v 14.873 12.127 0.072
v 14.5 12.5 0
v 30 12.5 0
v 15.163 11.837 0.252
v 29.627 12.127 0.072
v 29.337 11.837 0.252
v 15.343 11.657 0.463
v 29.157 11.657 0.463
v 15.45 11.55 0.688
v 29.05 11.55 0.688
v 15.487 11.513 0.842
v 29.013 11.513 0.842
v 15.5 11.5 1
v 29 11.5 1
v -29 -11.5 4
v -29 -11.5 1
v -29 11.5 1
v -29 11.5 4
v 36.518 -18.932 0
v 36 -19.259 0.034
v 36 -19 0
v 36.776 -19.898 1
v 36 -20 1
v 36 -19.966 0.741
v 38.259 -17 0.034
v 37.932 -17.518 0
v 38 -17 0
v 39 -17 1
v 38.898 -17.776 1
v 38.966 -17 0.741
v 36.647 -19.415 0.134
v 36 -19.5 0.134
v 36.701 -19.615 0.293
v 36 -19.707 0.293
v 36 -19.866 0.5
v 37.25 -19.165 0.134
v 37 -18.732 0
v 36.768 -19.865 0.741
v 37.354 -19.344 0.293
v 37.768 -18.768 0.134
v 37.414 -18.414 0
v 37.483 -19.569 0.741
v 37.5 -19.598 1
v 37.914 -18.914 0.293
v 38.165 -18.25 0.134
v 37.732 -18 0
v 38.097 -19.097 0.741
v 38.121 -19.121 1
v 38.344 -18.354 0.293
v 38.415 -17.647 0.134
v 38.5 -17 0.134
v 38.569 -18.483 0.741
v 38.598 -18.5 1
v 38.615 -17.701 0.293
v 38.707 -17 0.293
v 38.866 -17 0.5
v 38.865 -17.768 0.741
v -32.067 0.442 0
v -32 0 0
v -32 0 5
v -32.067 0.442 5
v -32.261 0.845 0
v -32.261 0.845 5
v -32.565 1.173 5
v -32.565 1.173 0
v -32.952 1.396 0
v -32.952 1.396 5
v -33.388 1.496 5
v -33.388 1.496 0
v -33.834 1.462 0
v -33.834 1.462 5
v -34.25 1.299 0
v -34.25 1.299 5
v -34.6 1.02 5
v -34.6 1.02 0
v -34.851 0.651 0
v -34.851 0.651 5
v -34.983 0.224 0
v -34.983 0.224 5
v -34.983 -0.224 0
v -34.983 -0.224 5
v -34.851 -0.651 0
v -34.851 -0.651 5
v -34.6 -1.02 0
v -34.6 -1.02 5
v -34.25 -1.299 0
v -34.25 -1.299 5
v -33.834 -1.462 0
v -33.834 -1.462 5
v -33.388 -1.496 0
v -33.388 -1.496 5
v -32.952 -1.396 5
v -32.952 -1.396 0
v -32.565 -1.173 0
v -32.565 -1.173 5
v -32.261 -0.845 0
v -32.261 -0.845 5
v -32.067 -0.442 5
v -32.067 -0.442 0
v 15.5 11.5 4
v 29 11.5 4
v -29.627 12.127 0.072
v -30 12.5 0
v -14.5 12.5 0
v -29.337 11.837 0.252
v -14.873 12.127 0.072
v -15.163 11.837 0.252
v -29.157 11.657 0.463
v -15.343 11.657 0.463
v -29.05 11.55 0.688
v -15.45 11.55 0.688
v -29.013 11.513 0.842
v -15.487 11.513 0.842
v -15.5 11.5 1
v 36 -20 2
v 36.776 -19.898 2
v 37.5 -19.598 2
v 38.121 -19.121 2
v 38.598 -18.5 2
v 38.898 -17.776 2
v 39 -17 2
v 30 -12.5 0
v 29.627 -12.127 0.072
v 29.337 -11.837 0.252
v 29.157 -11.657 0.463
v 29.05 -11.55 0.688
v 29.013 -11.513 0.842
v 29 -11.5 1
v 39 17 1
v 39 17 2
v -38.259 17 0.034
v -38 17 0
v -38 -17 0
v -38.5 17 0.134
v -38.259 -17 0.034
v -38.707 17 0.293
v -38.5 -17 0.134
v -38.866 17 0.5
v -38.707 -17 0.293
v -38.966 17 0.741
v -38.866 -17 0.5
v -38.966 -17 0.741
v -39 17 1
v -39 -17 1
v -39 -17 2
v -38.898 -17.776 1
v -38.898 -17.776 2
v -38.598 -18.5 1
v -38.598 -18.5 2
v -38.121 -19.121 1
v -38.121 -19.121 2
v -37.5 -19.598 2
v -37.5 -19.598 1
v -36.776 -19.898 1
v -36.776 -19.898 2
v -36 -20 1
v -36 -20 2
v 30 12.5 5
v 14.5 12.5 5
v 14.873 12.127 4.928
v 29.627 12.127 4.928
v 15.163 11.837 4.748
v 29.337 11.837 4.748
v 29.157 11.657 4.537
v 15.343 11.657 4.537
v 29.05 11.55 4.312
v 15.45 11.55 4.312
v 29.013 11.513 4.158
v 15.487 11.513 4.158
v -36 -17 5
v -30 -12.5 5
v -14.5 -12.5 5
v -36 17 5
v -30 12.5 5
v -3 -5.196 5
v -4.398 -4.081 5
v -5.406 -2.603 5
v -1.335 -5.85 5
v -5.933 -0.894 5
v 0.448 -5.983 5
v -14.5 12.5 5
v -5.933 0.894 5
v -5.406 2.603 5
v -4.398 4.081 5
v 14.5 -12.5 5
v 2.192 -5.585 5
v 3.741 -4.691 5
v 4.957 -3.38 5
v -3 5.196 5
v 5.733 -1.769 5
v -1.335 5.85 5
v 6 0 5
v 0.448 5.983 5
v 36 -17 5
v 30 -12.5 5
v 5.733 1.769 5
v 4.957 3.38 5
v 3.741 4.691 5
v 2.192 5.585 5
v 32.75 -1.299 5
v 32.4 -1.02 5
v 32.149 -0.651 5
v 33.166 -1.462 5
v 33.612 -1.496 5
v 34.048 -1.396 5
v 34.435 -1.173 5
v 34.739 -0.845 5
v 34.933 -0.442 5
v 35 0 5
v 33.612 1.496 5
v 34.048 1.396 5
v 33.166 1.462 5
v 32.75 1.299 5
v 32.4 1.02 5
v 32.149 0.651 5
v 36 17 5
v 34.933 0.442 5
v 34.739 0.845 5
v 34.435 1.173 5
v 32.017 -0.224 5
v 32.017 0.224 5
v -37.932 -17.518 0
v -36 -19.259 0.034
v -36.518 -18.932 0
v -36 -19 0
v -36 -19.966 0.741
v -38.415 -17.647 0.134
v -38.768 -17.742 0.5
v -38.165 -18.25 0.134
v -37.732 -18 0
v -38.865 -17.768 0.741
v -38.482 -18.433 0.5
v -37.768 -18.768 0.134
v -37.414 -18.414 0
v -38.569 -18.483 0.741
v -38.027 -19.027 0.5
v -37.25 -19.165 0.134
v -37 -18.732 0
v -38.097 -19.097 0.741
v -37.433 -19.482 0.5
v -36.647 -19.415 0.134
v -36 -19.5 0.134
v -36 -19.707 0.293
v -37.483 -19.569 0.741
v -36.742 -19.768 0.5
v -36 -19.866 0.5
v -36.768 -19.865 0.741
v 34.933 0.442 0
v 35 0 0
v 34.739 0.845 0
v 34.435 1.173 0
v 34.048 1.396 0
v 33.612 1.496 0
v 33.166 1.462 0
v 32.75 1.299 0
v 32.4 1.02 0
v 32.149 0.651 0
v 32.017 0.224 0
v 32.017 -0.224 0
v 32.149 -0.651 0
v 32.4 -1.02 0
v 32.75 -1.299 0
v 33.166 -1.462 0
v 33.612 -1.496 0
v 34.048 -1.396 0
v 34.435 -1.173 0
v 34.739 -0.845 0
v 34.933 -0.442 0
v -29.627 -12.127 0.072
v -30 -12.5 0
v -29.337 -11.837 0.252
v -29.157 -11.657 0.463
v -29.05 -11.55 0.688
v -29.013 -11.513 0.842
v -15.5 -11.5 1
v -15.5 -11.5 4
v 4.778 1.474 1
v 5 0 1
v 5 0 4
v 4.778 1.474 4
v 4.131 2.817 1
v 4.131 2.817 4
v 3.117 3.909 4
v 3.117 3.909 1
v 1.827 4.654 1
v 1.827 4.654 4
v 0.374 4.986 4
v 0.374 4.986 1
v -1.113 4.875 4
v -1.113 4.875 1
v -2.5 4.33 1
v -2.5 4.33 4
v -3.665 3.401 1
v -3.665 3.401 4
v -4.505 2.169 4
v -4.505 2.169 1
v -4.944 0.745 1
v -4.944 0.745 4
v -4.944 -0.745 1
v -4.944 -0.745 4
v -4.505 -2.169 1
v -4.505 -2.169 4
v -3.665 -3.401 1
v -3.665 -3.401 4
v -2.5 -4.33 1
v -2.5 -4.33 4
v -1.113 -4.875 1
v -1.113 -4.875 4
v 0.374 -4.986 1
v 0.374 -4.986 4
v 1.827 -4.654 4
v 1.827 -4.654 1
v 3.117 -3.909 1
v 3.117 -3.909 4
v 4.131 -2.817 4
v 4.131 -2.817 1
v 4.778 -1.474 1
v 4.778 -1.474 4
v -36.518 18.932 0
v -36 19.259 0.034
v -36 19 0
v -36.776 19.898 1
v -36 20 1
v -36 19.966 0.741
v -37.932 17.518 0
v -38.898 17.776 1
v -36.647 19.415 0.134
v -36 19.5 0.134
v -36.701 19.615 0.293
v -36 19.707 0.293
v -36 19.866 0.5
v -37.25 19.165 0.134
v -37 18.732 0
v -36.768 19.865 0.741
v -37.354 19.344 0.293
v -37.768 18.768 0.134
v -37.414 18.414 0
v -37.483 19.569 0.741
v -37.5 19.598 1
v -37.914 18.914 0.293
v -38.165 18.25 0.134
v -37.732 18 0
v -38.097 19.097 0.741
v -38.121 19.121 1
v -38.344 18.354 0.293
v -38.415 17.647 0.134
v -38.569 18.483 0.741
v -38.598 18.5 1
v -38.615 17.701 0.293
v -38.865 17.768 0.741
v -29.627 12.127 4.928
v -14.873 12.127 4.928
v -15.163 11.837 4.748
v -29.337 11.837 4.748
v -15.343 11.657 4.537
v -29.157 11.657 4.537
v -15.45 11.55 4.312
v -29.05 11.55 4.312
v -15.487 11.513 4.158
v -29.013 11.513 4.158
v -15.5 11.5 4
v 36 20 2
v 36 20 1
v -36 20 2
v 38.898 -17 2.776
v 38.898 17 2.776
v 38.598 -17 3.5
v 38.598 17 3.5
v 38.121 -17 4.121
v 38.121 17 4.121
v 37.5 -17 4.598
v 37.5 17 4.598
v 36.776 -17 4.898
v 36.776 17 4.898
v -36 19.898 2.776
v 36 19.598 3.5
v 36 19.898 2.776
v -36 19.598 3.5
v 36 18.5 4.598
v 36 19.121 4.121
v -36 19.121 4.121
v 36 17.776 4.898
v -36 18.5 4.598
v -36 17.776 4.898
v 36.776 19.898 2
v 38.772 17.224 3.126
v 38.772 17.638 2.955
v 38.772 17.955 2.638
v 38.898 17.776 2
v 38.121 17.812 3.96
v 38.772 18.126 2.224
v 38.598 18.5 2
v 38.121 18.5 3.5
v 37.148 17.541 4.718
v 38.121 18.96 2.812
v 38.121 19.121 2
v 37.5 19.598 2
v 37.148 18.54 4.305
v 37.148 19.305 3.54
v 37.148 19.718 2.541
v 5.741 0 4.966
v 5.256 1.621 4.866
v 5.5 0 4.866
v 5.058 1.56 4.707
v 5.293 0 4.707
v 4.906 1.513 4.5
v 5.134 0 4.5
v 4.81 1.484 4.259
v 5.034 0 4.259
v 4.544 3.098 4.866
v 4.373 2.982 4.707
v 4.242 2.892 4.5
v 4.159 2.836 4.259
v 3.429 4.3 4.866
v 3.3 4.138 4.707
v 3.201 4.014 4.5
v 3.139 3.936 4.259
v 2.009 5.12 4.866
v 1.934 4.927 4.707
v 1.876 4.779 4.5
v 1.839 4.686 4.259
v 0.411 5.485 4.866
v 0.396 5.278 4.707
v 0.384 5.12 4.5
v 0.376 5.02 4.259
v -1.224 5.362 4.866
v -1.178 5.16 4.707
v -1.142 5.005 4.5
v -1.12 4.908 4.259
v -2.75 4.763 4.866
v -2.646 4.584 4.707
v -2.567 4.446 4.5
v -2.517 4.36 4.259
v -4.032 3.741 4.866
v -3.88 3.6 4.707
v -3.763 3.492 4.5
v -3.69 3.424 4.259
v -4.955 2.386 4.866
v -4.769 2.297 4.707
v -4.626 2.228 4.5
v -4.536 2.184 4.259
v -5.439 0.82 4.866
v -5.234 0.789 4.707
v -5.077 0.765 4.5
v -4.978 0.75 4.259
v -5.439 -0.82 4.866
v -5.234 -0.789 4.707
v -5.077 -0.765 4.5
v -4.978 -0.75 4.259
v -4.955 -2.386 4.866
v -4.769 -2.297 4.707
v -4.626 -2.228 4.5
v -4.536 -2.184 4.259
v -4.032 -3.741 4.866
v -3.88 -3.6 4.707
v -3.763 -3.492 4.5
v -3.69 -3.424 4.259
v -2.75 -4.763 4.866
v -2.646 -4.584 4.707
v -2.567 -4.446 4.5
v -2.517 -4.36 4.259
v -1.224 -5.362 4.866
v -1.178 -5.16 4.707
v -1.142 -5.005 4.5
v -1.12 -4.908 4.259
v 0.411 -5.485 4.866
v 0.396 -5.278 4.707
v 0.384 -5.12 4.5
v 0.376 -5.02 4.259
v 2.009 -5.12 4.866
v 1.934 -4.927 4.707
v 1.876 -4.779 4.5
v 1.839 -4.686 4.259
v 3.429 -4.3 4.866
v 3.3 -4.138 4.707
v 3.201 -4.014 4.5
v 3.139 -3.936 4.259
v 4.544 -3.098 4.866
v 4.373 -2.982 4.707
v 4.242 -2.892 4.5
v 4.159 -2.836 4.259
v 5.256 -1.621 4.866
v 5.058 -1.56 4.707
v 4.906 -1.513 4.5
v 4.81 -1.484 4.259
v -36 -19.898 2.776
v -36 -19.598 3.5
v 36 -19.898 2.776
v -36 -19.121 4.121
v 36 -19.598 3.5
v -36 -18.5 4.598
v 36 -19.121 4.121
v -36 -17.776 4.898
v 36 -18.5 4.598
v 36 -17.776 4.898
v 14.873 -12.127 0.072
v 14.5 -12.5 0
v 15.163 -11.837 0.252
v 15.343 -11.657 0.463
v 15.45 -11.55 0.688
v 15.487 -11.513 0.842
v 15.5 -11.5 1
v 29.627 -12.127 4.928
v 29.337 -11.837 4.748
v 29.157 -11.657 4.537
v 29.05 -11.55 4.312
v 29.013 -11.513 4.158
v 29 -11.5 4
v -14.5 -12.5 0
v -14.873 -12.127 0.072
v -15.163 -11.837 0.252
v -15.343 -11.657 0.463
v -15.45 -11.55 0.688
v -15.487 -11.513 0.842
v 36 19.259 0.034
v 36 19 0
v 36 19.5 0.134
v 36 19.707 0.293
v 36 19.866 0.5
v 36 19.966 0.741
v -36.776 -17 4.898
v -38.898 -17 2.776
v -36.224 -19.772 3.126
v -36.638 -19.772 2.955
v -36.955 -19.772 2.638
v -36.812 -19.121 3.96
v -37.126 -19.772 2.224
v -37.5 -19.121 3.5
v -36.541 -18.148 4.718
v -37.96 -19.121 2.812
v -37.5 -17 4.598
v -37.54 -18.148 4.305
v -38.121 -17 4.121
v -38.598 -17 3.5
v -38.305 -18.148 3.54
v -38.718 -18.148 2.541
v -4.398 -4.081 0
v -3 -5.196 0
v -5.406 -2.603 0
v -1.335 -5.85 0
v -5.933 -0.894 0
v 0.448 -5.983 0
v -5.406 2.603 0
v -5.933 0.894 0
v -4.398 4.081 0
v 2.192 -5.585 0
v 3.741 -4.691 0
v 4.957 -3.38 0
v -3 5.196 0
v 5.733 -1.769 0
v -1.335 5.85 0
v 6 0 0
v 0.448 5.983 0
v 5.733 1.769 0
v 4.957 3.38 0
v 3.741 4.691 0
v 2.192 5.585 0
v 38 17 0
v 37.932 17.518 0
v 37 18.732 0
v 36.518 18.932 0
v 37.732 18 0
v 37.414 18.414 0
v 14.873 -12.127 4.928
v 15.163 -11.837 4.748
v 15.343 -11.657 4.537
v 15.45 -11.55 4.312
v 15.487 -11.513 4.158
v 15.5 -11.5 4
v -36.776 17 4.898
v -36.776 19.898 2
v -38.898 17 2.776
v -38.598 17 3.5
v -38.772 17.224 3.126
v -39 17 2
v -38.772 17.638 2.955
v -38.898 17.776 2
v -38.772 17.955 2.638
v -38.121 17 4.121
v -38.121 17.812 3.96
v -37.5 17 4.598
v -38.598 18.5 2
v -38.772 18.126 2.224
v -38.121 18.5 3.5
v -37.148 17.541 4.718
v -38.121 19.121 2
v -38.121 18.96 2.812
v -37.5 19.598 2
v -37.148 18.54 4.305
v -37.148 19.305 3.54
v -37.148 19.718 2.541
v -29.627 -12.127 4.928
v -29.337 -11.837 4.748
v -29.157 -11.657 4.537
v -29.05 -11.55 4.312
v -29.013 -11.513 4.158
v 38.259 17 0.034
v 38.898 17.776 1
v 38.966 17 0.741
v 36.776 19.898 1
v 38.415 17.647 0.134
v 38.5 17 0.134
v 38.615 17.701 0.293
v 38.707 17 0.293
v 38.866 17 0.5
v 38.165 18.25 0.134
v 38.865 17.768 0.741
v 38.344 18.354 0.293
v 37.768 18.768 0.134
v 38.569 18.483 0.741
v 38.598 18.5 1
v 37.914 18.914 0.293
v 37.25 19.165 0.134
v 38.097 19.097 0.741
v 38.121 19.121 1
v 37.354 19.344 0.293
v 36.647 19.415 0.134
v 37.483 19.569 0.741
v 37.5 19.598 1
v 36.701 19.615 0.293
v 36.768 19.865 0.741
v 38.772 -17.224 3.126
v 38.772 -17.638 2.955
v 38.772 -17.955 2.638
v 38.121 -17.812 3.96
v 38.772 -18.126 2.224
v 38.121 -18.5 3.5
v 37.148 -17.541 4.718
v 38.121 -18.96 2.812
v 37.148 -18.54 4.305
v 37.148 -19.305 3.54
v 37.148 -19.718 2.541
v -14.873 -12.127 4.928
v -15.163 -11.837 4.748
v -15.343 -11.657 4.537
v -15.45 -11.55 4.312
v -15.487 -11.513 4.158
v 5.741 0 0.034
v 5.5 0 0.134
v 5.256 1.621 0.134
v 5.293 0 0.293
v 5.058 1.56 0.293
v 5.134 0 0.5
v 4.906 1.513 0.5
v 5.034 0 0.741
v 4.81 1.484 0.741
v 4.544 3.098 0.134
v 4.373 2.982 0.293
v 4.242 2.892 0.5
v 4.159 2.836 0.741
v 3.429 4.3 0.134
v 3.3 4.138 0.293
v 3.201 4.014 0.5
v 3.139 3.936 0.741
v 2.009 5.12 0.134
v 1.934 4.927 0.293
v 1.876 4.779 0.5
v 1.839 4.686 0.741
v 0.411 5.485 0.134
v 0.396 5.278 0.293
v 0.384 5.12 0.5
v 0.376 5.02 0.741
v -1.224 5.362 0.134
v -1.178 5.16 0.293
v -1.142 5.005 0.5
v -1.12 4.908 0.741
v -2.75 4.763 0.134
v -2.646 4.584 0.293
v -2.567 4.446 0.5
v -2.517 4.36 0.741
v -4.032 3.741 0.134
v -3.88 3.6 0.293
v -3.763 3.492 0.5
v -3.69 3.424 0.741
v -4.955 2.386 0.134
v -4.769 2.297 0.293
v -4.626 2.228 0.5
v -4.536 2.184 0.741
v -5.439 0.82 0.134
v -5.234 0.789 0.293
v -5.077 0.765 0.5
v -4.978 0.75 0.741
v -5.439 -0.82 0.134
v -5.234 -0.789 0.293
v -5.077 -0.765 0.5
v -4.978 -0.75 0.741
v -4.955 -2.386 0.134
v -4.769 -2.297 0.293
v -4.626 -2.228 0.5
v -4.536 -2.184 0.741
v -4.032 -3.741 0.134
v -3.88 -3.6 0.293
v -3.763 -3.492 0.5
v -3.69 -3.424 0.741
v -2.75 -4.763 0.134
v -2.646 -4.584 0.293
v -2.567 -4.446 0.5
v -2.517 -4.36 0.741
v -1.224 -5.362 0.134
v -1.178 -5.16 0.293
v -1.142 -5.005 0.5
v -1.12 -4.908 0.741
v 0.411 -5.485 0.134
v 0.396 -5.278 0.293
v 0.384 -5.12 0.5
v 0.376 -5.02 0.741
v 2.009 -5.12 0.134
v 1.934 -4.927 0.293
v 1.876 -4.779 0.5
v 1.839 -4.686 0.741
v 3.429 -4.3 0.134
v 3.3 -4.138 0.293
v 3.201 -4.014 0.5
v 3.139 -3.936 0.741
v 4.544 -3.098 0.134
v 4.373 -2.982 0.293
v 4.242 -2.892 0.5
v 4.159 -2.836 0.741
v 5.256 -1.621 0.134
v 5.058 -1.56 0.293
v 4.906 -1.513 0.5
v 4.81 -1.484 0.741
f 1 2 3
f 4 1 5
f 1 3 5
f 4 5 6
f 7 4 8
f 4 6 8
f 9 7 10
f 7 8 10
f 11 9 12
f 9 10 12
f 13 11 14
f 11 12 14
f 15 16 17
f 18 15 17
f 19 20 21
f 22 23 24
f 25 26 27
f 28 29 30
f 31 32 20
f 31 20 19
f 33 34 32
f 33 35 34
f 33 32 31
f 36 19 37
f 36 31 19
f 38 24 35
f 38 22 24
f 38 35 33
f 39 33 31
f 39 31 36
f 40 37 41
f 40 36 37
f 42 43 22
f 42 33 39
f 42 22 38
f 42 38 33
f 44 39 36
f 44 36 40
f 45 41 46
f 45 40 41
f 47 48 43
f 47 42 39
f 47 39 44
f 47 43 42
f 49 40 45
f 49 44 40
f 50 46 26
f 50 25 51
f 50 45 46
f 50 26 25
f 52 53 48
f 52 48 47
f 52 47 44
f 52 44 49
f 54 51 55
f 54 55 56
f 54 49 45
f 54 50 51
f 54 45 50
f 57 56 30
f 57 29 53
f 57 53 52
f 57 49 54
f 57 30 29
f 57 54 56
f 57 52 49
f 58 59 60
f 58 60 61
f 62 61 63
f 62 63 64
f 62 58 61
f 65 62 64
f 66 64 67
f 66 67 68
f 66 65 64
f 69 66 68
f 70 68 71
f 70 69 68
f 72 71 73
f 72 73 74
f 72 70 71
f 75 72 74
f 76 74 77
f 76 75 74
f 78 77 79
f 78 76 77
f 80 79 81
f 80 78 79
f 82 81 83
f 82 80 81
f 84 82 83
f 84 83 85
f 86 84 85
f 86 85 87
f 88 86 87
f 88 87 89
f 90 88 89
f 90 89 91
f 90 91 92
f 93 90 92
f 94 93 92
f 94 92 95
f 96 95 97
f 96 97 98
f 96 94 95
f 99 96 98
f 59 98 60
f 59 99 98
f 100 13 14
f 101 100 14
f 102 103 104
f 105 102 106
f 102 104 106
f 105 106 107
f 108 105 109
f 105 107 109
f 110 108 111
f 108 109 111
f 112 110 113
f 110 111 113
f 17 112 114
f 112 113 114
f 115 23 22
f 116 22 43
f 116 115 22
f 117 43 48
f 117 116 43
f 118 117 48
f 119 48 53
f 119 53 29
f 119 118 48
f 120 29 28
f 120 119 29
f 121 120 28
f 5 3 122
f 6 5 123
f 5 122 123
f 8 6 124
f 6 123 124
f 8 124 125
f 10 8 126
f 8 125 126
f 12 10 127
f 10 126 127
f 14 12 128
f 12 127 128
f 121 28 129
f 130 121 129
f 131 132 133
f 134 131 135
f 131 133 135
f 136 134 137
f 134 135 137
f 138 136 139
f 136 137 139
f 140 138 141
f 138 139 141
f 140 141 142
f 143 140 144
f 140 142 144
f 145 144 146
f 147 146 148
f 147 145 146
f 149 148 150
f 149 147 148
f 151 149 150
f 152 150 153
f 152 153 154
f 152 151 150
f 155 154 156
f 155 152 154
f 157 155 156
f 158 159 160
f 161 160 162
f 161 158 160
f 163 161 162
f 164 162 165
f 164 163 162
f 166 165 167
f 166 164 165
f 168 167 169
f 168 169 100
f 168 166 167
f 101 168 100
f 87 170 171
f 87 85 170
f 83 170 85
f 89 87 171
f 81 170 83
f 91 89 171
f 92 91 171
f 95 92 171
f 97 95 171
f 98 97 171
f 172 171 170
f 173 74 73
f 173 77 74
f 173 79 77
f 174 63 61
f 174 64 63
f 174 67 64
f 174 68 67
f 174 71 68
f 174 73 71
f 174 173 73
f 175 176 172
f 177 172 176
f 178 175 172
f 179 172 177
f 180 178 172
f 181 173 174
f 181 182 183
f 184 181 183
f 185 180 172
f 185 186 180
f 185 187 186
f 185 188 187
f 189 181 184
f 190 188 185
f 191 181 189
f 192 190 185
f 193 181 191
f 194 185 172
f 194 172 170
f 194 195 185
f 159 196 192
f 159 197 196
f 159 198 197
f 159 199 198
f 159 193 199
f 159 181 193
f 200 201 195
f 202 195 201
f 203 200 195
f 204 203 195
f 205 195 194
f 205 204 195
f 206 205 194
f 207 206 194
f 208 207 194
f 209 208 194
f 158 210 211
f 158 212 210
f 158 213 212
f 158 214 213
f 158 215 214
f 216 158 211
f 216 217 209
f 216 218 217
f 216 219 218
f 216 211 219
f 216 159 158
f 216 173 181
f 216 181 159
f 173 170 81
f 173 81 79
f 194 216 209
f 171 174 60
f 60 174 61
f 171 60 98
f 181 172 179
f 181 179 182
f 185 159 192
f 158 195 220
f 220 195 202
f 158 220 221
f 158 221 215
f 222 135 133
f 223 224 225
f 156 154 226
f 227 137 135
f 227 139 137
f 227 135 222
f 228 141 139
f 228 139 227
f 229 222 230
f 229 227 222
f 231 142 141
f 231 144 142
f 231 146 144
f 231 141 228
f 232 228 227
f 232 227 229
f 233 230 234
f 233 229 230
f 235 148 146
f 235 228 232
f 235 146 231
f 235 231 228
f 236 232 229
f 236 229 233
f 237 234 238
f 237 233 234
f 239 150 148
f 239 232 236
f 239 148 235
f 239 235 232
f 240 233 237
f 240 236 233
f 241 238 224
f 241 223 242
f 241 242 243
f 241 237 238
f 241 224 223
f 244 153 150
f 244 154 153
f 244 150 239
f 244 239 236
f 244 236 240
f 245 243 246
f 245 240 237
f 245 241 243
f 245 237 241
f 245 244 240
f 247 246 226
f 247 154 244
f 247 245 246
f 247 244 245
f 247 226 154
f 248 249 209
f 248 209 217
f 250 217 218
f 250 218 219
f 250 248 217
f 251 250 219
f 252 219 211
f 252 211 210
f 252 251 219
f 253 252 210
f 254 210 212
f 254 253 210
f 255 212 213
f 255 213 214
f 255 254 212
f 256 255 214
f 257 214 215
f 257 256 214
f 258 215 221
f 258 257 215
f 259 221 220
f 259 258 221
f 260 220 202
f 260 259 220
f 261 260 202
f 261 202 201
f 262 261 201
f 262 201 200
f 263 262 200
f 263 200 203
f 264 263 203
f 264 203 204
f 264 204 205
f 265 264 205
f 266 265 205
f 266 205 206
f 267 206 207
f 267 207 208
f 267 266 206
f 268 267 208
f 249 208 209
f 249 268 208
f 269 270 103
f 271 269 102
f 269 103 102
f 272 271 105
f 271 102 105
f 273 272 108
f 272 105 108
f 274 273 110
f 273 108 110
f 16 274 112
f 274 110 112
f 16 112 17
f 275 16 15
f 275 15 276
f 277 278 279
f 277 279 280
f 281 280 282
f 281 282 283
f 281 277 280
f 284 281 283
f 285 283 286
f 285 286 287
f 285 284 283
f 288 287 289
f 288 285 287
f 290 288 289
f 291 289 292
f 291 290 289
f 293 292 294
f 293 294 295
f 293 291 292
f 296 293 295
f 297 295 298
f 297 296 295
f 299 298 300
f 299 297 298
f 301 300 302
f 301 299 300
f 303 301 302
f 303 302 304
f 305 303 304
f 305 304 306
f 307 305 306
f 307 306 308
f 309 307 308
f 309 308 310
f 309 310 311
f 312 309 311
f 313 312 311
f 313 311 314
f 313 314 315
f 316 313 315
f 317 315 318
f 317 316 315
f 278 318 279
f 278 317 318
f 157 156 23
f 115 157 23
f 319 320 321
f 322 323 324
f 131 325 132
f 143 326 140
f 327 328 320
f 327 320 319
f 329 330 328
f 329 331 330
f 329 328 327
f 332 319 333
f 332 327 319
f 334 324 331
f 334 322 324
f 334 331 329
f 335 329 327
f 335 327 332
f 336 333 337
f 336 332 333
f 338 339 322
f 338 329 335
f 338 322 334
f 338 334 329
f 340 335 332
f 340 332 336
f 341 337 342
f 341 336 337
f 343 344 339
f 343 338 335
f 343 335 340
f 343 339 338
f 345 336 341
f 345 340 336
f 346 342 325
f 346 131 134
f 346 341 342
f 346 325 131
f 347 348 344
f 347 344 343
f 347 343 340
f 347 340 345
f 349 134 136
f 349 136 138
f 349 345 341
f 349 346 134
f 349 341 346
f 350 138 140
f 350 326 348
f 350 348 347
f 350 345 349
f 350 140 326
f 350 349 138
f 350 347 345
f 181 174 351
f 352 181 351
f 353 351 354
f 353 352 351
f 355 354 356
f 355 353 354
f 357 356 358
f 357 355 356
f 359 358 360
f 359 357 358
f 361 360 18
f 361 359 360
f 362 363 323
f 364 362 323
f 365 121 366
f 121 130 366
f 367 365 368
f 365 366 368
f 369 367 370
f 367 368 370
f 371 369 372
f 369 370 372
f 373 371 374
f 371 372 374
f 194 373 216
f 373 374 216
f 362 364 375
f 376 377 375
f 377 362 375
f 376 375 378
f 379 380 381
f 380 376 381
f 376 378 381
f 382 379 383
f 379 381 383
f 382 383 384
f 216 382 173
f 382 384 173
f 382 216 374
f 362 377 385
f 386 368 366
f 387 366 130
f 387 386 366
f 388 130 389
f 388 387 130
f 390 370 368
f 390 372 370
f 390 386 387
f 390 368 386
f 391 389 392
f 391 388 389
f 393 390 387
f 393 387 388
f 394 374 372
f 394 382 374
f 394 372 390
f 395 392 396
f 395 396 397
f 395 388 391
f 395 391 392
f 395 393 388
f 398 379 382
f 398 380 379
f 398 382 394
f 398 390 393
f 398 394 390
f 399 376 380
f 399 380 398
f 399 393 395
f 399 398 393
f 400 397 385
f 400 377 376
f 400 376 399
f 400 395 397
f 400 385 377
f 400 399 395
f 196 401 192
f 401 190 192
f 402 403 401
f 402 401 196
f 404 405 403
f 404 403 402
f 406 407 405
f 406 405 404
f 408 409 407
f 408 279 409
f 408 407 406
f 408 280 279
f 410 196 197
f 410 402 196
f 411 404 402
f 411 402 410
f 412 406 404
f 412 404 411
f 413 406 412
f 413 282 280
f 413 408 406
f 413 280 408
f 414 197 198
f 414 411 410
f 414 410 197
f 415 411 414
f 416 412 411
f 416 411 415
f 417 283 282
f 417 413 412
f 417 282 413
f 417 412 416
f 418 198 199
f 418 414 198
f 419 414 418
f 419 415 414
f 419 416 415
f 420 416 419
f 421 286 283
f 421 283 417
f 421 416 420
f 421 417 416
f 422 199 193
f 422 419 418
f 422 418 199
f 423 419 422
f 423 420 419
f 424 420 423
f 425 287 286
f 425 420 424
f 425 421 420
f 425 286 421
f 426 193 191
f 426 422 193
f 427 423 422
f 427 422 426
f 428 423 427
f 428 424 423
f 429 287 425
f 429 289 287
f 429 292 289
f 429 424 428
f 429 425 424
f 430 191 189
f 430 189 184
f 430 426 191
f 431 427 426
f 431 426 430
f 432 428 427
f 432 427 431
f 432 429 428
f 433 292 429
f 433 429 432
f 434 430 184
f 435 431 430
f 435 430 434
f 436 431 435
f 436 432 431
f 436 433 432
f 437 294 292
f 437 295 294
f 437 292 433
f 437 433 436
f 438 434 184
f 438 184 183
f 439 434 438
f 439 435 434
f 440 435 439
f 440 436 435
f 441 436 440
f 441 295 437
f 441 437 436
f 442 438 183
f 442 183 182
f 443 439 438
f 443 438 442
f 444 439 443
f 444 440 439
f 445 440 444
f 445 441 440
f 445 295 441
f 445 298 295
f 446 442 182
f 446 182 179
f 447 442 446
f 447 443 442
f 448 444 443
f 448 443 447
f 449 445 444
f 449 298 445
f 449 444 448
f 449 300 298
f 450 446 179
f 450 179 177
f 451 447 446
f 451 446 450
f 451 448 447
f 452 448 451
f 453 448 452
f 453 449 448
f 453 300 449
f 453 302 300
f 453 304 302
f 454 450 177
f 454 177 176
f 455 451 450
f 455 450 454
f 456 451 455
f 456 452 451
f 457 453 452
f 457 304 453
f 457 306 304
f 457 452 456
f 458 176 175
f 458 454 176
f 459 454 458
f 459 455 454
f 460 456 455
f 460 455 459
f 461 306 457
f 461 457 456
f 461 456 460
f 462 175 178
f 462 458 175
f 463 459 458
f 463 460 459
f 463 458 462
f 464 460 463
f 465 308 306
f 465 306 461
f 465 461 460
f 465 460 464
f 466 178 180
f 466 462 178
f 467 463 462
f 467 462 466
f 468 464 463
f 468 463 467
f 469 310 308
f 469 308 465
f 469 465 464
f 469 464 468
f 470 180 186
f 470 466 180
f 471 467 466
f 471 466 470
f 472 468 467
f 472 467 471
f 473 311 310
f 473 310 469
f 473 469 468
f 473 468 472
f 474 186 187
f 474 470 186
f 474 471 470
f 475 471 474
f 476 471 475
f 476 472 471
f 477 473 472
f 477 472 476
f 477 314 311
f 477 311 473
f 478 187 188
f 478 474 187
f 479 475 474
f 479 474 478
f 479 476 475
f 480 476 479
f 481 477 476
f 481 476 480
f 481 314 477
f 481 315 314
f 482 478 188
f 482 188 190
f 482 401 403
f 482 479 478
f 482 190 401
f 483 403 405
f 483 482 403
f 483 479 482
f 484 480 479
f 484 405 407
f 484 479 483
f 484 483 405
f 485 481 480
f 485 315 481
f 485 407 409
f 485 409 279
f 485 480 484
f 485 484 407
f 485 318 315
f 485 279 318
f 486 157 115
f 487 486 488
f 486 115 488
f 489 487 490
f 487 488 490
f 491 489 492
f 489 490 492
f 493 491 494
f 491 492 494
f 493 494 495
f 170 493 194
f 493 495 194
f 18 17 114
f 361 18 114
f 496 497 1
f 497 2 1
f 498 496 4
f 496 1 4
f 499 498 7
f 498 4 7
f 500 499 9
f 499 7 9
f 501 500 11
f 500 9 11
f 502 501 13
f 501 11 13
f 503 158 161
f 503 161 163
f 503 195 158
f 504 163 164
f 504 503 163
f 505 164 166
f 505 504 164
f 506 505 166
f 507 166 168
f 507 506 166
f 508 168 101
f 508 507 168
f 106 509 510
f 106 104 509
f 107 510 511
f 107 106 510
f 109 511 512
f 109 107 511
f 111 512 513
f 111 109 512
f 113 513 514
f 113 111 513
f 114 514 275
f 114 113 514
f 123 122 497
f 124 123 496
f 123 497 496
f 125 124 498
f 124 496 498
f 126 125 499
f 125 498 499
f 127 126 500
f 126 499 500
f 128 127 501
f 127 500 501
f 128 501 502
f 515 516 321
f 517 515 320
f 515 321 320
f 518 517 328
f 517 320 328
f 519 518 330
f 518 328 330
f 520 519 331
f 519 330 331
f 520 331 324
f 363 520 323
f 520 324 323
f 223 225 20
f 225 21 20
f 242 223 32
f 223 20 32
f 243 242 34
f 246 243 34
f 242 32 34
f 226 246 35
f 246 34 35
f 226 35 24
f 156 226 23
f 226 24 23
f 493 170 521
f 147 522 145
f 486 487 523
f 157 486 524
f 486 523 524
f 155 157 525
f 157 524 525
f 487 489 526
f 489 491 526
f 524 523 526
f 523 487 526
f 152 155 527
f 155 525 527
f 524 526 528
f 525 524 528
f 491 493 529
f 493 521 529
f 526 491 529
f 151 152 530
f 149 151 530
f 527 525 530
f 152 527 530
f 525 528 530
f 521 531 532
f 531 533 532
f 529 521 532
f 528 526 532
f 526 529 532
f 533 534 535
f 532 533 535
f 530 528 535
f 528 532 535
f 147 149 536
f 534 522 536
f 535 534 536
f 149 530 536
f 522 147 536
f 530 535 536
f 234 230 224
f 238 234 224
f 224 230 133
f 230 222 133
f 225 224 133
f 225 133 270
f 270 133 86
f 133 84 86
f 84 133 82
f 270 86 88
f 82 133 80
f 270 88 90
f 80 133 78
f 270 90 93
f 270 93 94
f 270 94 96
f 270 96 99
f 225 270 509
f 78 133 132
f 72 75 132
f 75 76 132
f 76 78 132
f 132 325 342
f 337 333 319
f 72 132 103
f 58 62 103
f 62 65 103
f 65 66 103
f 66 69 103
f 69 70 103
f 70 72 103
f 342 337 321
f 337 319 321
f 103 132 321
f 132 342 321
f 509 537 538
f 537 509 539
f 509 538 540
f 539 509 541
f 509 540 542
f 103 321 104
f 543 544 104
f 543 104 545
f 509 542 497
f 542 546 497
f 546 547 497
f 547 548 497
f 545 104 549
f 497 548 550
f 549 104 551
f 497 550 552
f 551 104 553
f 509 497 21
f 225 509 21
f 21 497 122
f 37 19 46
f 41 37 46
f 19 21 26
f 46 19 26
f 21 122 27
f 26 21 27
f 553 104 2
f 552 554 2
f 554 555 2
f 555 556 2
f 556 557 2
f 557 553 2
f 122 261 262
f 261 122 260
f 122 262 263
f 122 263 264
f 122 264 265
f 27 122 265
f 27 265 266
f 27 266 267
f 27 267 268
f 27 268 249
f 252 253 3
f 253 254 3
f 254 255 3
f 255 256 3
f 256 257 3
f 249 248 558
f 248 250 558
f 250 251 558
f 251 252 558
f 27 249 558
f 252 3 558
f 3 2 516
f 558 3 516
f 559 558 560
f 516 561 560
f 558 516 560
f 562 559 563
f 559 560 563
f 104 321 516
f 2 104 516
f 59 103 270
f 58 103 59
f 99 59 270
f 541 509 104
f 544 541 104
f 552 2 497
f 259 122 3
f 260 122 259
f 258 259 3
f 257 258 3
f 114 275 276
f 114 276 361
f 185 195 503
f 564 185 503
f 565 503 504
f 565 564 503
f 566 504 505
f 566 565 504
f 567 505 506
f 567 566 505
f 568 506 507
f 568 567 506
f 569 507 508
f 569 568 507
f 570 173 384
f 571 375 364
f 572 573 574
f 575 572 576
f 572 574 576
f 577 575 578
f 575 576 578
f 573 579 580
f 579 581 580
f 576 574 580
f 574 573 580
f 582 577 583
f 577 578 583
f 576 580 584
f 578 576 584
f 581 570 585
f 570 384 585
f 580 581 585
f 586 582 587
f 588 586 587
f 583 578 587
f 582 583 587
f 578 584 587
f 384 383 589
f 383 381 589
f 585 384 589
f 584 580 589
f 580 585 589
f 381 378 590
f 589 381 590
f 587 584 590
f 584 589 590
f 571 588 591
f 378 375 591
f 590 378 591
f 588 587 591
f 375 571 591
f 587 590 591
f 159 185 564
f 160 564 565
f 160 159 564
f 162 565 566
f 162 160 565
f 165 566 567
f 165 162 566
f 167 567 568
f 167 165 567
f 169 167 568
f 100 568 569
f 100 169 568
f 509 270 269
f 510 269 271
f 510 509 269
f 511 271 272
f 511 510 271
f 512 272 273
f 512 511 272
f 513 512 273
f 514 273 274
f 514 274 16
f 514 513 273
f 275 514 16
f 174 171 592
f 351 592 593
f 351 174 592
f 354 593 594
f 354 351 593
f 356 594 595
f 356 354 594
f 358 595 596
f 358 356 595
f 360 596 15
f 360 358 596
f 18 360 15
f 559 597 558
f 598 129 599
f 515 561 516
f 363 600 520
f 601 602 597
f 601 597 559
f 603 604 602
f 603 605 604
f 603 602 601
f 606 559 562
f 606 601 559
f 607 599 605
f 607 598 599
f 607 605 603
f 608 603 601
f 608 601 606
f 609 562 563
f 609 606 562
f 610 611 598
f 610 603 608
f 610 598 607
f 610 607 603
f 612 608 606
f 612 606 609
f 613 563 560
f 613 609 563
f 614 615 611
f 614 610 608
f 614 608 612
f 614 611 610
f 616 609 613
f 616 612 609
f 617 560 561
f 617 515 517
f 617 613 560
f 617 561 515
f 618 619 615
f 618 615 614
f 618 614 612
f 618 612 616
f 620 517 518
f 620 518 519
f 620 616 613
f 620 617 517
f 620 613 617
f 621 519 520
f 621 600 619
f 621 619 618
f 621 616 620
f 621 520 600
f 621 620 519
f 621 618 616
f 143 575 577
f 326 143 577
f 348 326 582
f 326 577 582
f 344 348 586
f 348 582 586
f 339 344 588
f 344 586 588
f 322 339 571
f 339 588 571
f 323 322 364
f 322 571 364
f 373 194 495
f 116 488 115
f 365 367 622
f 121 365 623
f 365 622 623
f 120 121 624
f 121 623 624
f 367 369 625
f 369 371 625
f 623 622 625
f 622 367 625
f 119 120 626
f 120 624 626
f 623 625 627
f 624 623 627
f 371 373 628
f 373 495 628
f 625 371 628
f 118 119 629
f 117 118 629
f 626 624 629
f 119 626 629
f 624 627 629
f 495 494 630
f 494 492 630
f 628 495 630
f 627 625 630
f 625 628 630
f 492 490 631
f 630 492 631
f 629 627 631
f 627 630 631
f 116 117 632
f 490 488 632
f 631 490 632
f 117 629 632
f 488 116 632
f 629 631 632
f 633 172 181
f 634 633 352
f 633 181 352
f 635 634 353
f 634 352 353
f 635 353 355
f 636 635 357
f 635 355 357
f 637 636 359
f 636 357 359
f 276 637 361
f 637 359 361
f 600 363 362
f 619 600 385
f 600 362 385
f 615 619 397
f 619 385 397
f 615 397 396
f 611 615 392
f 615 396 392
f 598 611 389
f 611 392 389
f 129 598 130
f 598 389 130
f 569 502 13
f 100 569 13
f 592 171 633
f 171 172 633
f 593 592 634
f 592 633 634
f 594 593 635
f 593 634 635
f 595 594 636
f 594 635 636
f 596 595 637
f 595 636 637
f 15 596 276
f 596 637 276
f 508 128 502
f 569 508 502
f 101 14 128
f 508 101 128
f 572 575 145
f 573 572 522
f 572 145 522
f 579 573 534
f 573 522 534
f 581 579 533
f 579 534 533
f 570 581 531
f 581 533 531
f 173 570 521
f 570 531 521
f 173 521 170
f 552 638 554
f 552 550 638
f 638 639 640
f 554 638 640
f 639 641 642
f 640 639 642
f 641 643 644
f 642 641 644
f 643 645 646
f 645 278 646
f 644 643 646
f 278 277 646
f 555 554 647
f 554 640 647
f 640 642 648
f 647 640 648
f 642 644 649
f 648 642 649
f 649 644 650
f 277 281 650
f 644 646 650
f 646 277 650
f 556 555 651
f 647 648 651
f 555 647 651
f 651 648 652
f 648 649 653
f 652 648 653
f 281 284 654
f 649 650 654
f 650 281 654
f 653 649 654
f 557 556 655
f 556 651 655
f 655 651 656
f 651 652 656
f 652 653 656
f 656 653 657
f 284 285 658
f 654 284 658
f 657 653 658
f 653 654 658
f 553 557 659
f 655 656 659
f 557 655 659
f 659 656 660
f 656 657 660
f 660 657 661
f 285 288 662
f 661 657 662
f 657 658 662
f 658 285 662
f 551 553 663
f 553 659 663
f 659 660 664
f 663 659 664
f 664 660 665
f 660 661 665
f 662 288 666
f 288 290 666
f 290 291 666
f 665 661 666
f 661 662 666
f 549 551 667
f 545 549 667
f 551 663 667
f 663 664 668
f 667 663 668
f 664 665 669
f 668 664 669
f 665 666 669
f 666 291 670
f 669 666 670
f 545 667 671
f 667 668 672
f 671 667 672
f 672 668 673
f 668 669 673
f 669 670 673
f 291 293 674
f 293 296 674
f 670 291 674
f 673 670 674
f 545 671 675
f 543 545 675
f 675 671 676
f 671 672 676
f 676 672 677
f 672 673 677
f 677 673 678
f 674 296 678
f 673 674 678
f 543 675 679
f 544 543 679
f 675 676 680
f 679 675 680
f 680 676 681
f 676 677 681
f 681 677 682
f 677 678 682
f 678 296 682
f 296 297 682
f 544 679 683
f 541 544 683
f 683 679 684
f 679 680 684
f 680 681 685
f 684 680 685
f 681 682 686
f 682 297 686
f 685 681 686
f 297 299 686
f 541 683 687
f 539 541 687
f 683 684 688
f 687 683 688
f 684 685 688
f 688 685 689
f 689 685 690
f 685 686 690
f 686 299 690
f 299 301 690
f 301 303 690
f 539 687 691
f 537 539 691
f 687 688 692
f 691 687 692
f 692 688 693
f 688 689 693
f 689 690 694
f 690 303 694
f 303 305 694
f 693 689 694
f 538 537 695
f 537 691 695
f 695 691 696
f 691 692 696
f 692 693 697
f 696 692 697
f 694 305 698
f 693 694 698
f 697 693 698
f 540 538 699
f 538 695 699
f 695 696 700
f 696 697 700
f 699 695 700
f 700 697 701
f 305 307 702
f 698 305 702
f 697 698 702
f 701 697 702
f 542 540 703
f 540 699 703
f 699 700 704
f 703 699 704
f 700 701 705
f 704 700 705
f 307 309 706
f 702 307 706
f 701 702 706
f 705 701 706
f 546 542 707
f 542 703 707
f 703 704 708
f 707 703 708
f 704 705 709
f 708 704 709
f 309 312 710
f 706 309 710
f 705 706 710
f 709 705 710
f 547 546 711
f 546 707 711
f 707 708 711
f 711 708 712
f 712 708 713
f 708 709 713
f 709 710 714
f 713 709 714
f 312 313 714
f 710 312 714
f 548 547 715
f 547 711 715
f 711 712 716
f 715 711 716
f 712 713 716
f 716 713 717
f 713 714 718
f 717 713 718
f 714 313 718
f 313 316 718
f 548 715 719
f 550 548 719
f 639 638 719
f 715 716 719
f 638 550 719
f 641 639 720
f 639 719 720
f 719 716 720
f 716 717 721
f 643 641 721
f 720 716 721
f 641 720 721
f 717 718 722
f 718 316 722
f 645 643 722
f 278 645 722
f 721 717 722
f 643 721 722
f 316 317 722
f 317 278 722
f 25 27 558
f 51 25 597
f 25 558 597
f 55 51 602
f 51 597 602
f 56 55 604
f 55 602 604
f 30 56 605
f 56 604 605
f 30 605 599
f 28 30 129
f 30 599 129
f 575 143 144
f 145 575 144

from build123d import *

# Parameters (mm, degrees)
F0_R     = 1.5
F0_W     = 13.5
F0_H     = 23
F0_R_2   = 5
F1_DEPTH = 5
F2_R     = 3
F3_R     = 1
F4_R     = 1


with BuildPart() as f1:
    # F0 (on Top) → F1 (new body)
    with BuildSketch(Plane.XY):
        Polygon((0, 20), (-39, 20), (-39, -20), (39, -20), (39, 0), (39, 20), align=None)
        with Locations((-33.5, 0)):
            Circle(F0_R, mode=Mode.SUBTRACT)
        with Locations((-22.25, 0)):
            Rectangle(F0_W, F0_H, mode=Mode.SUBTRACT)
        Circle(F0_R_2, mode=Mode.SUBTRACT)
        Polygon((15.5, 11.5), (29, 11.5), (29, 0), (29, -11.5), (15.5, -11.5), align=None, mode=Mode.SUBTRACT)
        with Locations((33.5, 0)):
            Circle(F0_R, mode=Mode.SUBTRACT)
    extrude(amount=F1_DEPTH)

    # F2
    f2_edges = [f1.edges().sort_by_distance(p)[0] for p in [
        (0, 20, 5),
        (-39, 0, 5),
        (0, -20, 5),
        (39, 0, 5),
        (-39, -20, 2.5),
        (-39, 20, 2.5),
        (39, 20, 2.5),
        (39, -20, 2.5),
    ]]
    fillet(f2_edges, radius=F2_R)

    # F3
    f3_edges = [f1.edges().sort_by_distance(p)[0] for p in [
        (0, -20, 0),
    ]]
    fillet(f3_edges, radius=F3_R)

    # F4
    f4_edges = [f1.edges().sort_by_distance(p)[0] for p in [
        (-22.25, -11.5, 5),
        (-15.5, 0, 5),
        (-22.25, 11.5, 5),
        (-29, 0, 5),
        (15.5, 0, 5),
        (22.25, 11.5, 5),
        (29, 0, 5),
        (22.25, -11.5, 5),
        (-29, 0, 0),
        (-15.5, 0, 0),
        (-22.25, 11.5, 0),
        (-22.25, -11.5, 0),
        (22.25, -11.5, 0),
        (29, 0, 0),
        (22.25, 11.5, 0),
        (15.5, 0, 0),
        (-5, 0, 5),
        (-5, 0, 0),
    ]]
    fillet(f4_edges, radius=F4_R)


solid = f1.part
